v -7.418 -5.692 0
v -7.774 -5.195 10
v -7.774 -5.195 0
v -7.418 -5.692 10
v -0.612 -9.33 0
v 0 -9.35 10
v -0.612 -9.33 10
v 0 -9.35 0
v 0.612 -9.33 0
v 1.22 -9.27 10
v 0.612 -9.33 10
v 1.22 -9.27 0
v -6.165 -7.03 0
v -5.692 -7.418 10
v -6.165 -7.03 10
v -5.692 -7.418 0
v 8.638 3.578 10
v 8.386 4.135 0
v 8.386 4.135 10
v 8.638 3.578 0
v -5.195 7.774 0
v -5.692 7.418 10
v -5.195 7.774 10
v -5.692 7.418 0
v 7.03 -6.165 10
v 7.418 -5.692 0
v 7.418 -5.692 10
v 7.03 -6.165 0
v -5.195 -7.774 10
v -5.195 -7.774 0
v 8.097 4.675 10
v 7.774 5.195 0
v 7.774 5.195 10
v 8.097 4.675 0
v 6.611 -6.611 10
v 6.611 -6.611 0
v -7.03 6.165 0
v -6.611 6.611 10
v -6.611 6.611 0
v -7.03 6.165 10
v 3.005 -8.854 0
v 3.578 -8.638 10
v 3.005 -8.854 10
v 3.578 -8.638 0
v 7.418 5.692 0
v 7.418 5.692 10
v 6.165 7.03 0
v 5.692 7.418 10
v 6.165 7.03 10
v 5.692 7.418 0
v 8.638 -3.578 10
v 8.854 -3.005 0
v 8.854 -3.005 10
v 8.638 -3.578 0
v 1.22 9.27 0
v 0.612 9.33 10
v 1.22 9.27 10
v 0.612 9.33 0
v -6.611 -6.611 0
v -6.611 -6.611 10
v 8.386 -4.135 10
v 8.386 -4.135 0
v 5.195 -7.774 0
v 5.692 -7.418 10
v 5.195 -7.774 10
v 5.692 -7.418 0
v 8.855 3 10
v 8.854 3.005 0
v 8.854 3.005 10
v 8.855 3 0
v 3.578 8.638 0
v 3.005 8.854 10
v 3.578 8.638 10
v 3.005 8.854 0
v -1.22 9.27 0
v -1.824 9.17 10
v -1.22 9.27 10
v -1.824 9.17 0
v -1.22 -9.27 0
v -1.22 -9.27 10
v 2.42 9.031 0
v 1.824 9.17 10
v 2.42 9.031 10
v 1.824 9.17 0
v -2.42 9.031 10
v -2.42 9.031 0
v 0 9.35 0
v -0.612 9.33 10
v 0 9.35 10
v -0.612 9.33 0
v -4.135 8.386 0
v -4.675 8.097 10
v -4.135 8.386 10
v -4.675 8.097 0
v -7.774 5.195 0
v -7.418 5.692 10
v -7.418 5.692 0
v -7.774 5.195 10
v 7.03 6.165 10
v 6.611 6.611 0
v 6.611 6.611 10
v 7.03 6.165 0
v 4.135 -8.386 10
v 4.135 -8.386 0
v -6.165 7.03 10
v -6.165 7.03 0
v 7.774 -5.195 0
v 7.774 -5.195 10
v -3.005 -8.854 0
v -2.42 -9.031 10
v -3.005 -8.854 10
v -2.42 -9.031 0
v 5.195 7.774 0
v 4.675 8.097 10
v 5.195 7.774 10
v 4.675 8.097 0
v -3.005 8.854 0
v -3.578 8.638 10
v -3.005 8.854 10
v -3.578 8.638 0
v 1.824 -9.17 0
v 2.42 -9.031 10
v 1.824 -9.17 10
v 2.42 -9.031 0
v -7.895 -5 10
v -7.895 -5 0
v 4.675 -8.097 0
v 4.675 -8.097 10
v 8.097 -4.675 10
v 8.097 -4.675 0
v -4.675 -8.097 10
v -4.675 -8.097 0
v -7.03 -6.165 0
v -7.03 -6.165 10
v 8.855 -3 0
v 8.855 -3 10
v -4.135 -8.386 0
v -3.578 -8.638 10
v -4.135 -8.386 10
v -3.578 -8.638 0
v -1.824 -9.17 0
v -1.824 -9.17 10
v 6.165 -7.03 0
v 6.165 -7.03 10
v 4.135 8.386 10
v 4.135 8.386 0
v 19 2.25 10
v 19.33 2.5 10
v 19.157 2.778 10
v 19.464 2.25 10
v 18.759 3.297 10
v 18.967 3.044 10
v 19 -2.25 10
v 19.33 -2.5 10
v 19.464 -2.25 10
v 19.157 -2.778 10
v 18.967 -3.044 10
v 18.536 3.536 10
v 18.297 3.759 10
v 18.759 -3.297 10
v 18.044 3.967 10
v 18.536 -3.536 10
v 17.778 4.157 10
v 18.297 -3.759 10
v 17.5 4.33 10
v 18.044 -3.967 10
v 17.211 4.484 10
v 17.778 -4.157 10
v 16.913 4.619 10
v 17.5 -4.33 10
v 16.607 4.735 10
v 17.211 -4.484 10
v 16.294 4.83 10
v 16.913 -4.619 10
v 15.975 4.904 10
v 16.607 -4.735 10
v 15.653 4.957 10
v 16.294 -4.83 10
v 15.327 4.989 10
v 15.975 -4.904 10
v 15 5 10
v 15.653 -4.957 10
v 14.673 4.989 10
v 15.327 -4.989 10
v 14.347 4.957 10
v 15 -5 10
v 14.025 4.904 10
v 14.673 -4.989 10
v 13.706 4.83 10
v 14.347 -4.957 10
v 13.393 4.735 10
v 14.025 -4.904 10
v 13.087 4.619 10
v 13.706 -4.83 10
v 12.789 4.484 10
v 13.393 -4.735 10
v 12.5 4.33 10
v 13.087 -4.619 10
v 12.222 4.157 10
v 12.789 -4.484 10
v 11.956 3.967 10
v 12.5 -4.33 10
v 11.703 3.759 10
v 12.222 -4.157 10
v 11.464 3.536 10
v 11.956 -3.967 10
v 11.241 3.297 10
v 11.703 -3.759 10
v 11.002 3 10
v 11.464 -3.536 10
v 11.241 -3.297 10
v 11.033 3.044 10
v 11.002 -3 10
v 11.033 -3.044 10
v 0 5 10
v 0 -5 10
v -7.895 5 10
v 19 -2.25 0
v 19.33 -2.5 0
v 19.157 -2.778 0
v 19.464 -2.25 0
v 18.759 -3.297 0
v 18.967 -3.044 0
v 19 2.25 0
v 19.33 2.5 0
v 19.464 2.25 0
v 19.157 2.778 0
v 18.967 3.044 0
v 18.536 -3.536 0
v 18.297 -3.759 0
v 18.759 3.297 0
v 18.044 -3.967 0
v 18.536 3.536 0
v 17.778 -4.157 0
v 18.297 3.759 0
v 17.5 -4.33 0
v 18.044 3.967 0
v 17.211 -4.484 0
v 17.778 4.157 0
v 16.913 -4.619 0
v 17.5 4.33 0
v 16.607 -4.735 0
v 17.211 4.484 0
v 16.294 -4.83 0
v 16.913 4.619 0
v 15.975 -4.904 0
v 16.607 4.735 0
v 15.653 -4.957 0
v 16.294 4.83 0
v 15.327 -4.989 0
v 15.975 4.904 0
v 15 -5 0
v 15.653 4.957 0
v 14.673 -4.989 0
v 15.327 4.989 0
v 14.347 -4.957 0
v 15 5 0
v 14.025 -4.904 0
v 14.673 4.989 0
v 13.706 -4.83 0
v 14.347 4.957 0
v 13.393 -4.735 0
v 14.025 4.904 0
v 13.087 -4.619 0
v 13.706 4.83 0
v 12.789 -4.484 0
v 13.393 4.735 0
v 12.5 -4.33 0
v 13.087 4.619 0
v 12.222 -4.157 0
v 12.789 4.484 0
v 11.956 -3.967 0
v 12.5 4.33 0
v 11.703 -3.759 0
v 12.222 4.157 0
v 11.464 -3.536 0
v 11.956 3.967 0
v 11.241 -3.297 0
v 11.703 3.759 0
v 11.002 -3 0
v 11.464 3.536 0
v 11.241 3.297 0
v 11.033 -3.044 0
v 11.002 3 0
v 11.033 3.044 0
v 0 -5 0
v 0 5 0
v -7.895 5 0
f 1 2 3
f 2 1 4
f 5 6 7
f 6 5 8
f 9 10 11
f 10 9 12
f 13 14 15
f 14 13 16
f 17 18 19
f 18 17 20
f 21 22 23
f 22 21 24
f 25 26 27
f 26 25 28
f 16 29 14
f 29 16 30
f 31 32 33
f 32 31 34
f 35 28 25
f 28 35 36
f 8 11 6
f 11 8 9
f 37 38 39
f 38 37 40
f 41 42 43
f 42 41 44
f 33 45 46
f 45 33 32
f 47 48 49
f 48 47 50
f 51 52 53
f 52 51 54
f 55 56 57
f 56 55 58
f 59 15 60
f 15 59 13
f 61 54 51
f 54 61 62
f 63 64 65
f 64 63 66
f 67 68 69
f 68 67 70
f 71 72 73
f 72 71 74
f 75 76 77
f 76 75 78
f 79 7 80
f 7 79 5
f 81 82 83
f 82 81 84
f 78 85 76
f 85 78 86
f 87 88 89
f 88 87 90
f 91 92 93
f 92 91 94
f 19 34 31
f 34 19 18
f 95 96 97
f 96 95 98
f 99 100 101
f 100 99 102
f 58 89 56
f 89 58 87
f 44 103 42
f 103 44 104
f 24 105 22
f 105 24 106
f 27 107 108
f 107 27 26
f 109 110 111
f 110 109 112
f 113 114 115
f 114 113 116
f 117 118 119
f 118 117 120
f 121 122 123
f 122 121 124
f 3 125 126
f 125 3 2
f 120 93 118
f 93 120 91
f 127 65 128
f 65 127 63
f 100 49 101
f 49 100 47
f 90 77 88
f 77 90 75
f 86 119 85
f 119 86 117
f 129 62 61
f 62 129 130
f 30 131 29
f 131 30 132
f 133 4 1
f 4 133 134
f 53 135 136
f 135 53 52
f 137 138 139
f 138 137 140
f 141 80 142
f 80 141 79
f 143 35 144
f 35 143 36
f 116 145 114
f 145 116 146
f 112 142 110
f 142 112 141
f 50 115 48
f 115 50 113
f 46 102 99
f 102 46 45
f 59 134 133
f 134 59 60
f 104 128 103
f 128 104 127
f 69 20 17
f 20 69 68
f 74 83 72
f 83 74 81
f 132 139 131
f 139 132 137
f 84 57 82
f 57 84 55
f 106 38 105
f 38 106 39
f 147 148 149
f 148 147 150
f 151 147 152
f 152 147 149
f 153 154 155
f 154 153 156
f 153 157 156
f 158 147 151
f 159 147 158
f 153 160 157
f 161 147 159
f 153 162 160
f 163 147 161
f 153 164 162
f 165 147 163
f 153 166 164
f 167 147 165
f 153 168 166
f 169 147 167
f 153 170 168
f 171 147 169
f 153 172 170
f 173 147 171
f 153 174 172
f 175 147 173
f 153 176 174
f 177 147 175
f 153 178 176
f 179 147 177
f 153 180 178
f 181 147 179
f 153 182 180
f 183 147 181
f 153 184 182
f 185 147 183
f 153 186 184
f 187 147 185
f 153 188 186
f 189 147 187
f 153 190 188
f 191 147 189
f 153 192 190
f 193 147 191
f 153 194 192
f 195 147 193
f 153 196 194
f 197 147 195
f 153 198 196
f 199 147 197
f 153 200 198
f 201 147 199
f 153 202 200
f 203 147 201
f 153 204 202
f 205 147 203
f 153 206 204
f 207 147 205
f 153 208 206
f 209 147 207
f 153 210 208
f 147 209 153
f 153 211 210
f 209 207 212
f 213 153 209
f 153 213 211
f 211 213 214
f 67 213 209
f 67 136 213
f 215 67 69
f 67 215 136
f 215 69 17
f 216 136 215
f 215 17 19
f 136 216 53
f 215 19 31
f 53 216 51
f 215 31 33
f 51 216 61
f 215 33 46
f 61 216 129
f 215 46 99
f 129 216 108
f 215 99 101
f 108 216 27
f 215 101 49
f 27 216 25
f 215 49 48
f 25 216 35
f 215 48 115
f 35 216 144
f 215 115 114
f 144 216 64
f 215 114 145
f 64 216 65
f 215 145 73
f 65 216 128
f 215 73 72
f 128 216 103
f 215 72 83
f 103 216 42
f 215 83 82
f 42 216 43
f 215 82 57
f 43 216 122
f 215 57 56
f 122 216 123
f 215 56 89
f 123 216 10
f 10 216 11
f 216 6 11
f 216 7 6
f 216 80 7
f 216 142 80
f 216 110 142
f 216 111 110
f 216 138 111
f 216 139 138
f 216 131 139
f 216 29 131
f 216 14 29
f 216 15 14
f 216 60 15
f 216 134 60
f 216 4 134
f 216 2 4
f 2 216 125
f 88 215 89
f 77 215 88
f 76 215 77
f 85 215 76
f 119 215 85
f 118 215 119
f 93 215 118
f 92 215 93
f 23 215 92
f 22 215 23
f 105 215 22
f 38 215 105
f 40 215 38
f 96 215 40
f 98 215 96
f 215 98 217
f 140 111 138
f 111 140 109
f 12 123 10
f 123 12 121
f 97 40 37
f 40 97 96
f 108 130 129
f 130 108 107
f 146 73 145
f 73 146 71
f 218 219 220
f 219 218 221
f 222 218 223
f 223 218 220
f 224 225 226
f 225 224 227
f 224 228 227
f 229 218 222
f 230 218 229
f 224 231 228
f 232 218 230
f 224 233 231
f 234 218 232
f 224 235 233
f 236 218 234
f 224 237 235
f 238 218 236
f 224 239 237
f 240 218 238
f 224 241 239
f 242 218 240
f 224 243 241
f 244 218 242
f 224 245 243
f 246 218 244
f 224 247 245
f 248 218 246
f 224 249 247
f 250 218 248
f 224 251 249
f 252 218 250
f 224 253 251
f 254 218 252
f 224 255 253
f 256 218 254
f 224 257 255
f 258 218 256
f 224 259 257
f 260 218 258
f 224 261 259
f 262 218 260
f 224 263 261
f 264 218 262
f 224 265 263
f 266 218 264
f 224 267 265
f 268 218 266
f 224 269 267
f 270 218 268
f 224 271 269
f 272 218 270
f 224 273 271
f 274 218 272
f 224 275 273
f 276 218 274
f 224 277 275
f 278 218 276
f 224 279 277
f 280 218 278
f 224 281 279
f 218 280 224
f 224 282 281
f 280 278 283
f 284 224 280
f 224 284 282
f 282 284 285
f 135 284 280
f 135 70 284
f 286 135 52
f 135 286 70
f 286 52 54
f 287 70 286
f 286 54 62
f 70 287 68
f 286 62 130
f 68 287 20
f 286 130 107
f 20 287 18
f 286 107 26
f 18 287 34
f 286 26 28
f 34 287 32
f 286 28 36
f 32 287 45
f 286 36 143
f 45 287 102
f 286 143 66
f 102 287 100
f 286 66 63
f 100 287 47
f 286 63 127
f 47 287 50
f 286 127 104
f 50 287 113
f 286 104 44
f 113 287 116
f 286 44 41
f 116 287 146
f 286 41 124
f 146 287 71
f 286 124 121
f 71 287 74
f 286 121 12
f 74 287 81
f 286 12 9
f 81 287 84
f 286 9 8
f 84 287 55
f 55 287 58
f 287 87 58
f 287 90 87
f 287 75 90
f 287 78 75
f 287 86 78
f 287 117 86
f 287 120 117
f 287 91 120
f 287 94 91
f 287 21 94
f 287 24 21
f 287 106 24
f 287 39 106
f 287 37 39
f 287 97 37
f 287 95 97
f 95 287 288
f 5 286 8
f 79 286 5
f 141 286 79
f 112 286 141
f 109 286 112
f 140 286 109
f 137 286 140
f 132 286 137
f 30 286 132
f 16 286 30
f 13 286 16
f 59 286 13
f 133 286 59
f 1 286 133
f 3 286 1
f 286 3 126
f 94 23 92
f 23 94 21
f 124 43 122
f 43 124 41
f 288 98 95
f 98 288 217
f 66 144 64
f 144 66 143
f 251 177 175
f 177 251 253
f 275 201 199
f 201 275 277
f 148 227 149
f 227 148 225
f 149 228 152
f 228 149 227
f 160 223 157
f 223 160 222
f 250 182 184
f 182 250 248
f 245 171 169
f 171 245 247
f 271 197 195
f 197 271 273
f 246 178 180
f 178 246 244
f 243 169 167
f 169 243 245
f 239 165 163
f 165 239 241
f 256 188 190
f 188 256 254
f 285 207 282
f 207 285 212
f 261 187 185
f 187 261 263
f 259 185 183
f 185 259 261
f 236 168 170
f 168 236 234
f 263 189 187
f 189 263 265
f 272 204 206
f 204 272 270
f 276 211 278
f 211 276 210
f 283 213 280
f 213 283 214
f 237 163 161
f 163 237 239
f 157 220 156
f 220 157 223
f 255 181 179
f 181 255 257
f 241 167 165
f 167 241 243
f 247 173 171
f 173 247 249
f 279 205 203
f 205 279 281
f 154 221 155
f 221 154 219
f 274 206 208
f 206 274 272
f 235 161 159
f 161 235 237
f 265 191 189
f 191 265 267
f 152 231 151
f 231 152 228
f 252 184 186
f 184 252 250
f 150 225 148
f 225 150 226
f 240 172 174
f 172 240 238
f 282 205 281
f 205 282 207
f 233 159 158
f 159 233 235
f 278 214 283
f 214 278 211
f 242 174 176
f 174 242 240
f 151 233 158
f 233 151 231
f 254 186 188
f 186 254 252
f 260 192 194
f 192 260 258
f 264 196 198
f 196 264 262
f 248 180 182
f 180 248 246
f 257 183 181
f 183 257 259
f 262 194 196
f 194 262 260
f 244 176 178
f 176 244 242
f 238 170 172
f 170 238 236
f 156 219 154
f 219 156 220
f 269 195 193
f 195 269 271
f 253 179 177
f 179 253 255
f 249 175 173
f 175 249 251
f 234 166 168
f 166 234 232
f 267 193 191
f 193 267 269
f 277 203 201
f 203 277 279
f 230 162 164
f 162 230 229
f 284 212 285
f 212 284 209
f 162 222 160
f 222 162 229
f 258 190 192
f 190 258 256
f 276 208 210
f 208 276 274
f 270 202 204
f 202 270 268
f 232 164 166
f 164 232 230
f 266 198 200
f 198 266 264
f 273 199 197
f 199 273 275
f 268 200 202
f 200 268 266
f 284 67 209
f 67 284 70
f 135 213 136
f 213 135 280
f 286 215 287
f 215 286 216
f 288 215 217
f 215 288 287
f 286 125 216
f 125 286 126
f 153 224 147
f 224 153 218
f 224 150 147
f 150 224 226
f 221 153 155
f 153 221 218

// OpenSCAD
// Snap-on tubing clip for a 12.7 mm lab stand rod
// Print orientation: flat on the bed, extruded along +Z

$fn = 96;

// ---- Rod ring ----
rod_id   = 12.7;   // rod inner diameter
rod_wall = 3;      // rod ring wall thickness
rod_od   = rod_id + 2 * rod_wall;  // 18.7 mm outer diameter

// ---- Tubing ring ----
tube_id  = 6;      // tubing inner diameter
tube_wall = 2;     // tubing ring wall thickness
tube_od  = tube_id + 2 * tube_wall;  // 10 mm outer diameter
tube_x   = 15;     // tubing ring centre X
tube_y   = 0;      // tubing ring centre Y

// ---- Opening cuts ----
cut_rod_w = 10;    // rod opening width along -X
cut_tube_w = 4.5;  // tubing opening width along +X

// ---- Bridge ----
bridge_w = 6;      // bridge width along Y
bridge_x0 = 8;     // bridge start X
bridge_x1 = 12;    // bridge end X

// ---- Clearance for clean booleans ----
eps = 0.5;

difference() {
    union() {
        // Rod ring
        cylinder(d = rod_od, h = 10, $fn = 96);
        // Tubing ring
        translate([tube_x, tube_y, 0])
            cylinder(d = tube_od, h = 10, $fn = 96);
        // Bridge between the rings
        translate([bridge_x0, -bridge_w / 2, 0])
            cube([bridge_x1 - bridge_x0, bridge_w, 10]);
    }
    // Cut out the -X side of the rod ring
    translate([-cut_rod_w - eps, -cut_rod_w / 2, -eps])
        cube([cut_rod_w + eps, cut_rod_w, 11]);
    // Cut out the +X side of the tubing ring
    translate([tube_x + cut_tube_w - eps, -cut_tube_w / 2, -eps])
        cube([cut_tube_w + eps, cut_tube_w, 11]);
}
